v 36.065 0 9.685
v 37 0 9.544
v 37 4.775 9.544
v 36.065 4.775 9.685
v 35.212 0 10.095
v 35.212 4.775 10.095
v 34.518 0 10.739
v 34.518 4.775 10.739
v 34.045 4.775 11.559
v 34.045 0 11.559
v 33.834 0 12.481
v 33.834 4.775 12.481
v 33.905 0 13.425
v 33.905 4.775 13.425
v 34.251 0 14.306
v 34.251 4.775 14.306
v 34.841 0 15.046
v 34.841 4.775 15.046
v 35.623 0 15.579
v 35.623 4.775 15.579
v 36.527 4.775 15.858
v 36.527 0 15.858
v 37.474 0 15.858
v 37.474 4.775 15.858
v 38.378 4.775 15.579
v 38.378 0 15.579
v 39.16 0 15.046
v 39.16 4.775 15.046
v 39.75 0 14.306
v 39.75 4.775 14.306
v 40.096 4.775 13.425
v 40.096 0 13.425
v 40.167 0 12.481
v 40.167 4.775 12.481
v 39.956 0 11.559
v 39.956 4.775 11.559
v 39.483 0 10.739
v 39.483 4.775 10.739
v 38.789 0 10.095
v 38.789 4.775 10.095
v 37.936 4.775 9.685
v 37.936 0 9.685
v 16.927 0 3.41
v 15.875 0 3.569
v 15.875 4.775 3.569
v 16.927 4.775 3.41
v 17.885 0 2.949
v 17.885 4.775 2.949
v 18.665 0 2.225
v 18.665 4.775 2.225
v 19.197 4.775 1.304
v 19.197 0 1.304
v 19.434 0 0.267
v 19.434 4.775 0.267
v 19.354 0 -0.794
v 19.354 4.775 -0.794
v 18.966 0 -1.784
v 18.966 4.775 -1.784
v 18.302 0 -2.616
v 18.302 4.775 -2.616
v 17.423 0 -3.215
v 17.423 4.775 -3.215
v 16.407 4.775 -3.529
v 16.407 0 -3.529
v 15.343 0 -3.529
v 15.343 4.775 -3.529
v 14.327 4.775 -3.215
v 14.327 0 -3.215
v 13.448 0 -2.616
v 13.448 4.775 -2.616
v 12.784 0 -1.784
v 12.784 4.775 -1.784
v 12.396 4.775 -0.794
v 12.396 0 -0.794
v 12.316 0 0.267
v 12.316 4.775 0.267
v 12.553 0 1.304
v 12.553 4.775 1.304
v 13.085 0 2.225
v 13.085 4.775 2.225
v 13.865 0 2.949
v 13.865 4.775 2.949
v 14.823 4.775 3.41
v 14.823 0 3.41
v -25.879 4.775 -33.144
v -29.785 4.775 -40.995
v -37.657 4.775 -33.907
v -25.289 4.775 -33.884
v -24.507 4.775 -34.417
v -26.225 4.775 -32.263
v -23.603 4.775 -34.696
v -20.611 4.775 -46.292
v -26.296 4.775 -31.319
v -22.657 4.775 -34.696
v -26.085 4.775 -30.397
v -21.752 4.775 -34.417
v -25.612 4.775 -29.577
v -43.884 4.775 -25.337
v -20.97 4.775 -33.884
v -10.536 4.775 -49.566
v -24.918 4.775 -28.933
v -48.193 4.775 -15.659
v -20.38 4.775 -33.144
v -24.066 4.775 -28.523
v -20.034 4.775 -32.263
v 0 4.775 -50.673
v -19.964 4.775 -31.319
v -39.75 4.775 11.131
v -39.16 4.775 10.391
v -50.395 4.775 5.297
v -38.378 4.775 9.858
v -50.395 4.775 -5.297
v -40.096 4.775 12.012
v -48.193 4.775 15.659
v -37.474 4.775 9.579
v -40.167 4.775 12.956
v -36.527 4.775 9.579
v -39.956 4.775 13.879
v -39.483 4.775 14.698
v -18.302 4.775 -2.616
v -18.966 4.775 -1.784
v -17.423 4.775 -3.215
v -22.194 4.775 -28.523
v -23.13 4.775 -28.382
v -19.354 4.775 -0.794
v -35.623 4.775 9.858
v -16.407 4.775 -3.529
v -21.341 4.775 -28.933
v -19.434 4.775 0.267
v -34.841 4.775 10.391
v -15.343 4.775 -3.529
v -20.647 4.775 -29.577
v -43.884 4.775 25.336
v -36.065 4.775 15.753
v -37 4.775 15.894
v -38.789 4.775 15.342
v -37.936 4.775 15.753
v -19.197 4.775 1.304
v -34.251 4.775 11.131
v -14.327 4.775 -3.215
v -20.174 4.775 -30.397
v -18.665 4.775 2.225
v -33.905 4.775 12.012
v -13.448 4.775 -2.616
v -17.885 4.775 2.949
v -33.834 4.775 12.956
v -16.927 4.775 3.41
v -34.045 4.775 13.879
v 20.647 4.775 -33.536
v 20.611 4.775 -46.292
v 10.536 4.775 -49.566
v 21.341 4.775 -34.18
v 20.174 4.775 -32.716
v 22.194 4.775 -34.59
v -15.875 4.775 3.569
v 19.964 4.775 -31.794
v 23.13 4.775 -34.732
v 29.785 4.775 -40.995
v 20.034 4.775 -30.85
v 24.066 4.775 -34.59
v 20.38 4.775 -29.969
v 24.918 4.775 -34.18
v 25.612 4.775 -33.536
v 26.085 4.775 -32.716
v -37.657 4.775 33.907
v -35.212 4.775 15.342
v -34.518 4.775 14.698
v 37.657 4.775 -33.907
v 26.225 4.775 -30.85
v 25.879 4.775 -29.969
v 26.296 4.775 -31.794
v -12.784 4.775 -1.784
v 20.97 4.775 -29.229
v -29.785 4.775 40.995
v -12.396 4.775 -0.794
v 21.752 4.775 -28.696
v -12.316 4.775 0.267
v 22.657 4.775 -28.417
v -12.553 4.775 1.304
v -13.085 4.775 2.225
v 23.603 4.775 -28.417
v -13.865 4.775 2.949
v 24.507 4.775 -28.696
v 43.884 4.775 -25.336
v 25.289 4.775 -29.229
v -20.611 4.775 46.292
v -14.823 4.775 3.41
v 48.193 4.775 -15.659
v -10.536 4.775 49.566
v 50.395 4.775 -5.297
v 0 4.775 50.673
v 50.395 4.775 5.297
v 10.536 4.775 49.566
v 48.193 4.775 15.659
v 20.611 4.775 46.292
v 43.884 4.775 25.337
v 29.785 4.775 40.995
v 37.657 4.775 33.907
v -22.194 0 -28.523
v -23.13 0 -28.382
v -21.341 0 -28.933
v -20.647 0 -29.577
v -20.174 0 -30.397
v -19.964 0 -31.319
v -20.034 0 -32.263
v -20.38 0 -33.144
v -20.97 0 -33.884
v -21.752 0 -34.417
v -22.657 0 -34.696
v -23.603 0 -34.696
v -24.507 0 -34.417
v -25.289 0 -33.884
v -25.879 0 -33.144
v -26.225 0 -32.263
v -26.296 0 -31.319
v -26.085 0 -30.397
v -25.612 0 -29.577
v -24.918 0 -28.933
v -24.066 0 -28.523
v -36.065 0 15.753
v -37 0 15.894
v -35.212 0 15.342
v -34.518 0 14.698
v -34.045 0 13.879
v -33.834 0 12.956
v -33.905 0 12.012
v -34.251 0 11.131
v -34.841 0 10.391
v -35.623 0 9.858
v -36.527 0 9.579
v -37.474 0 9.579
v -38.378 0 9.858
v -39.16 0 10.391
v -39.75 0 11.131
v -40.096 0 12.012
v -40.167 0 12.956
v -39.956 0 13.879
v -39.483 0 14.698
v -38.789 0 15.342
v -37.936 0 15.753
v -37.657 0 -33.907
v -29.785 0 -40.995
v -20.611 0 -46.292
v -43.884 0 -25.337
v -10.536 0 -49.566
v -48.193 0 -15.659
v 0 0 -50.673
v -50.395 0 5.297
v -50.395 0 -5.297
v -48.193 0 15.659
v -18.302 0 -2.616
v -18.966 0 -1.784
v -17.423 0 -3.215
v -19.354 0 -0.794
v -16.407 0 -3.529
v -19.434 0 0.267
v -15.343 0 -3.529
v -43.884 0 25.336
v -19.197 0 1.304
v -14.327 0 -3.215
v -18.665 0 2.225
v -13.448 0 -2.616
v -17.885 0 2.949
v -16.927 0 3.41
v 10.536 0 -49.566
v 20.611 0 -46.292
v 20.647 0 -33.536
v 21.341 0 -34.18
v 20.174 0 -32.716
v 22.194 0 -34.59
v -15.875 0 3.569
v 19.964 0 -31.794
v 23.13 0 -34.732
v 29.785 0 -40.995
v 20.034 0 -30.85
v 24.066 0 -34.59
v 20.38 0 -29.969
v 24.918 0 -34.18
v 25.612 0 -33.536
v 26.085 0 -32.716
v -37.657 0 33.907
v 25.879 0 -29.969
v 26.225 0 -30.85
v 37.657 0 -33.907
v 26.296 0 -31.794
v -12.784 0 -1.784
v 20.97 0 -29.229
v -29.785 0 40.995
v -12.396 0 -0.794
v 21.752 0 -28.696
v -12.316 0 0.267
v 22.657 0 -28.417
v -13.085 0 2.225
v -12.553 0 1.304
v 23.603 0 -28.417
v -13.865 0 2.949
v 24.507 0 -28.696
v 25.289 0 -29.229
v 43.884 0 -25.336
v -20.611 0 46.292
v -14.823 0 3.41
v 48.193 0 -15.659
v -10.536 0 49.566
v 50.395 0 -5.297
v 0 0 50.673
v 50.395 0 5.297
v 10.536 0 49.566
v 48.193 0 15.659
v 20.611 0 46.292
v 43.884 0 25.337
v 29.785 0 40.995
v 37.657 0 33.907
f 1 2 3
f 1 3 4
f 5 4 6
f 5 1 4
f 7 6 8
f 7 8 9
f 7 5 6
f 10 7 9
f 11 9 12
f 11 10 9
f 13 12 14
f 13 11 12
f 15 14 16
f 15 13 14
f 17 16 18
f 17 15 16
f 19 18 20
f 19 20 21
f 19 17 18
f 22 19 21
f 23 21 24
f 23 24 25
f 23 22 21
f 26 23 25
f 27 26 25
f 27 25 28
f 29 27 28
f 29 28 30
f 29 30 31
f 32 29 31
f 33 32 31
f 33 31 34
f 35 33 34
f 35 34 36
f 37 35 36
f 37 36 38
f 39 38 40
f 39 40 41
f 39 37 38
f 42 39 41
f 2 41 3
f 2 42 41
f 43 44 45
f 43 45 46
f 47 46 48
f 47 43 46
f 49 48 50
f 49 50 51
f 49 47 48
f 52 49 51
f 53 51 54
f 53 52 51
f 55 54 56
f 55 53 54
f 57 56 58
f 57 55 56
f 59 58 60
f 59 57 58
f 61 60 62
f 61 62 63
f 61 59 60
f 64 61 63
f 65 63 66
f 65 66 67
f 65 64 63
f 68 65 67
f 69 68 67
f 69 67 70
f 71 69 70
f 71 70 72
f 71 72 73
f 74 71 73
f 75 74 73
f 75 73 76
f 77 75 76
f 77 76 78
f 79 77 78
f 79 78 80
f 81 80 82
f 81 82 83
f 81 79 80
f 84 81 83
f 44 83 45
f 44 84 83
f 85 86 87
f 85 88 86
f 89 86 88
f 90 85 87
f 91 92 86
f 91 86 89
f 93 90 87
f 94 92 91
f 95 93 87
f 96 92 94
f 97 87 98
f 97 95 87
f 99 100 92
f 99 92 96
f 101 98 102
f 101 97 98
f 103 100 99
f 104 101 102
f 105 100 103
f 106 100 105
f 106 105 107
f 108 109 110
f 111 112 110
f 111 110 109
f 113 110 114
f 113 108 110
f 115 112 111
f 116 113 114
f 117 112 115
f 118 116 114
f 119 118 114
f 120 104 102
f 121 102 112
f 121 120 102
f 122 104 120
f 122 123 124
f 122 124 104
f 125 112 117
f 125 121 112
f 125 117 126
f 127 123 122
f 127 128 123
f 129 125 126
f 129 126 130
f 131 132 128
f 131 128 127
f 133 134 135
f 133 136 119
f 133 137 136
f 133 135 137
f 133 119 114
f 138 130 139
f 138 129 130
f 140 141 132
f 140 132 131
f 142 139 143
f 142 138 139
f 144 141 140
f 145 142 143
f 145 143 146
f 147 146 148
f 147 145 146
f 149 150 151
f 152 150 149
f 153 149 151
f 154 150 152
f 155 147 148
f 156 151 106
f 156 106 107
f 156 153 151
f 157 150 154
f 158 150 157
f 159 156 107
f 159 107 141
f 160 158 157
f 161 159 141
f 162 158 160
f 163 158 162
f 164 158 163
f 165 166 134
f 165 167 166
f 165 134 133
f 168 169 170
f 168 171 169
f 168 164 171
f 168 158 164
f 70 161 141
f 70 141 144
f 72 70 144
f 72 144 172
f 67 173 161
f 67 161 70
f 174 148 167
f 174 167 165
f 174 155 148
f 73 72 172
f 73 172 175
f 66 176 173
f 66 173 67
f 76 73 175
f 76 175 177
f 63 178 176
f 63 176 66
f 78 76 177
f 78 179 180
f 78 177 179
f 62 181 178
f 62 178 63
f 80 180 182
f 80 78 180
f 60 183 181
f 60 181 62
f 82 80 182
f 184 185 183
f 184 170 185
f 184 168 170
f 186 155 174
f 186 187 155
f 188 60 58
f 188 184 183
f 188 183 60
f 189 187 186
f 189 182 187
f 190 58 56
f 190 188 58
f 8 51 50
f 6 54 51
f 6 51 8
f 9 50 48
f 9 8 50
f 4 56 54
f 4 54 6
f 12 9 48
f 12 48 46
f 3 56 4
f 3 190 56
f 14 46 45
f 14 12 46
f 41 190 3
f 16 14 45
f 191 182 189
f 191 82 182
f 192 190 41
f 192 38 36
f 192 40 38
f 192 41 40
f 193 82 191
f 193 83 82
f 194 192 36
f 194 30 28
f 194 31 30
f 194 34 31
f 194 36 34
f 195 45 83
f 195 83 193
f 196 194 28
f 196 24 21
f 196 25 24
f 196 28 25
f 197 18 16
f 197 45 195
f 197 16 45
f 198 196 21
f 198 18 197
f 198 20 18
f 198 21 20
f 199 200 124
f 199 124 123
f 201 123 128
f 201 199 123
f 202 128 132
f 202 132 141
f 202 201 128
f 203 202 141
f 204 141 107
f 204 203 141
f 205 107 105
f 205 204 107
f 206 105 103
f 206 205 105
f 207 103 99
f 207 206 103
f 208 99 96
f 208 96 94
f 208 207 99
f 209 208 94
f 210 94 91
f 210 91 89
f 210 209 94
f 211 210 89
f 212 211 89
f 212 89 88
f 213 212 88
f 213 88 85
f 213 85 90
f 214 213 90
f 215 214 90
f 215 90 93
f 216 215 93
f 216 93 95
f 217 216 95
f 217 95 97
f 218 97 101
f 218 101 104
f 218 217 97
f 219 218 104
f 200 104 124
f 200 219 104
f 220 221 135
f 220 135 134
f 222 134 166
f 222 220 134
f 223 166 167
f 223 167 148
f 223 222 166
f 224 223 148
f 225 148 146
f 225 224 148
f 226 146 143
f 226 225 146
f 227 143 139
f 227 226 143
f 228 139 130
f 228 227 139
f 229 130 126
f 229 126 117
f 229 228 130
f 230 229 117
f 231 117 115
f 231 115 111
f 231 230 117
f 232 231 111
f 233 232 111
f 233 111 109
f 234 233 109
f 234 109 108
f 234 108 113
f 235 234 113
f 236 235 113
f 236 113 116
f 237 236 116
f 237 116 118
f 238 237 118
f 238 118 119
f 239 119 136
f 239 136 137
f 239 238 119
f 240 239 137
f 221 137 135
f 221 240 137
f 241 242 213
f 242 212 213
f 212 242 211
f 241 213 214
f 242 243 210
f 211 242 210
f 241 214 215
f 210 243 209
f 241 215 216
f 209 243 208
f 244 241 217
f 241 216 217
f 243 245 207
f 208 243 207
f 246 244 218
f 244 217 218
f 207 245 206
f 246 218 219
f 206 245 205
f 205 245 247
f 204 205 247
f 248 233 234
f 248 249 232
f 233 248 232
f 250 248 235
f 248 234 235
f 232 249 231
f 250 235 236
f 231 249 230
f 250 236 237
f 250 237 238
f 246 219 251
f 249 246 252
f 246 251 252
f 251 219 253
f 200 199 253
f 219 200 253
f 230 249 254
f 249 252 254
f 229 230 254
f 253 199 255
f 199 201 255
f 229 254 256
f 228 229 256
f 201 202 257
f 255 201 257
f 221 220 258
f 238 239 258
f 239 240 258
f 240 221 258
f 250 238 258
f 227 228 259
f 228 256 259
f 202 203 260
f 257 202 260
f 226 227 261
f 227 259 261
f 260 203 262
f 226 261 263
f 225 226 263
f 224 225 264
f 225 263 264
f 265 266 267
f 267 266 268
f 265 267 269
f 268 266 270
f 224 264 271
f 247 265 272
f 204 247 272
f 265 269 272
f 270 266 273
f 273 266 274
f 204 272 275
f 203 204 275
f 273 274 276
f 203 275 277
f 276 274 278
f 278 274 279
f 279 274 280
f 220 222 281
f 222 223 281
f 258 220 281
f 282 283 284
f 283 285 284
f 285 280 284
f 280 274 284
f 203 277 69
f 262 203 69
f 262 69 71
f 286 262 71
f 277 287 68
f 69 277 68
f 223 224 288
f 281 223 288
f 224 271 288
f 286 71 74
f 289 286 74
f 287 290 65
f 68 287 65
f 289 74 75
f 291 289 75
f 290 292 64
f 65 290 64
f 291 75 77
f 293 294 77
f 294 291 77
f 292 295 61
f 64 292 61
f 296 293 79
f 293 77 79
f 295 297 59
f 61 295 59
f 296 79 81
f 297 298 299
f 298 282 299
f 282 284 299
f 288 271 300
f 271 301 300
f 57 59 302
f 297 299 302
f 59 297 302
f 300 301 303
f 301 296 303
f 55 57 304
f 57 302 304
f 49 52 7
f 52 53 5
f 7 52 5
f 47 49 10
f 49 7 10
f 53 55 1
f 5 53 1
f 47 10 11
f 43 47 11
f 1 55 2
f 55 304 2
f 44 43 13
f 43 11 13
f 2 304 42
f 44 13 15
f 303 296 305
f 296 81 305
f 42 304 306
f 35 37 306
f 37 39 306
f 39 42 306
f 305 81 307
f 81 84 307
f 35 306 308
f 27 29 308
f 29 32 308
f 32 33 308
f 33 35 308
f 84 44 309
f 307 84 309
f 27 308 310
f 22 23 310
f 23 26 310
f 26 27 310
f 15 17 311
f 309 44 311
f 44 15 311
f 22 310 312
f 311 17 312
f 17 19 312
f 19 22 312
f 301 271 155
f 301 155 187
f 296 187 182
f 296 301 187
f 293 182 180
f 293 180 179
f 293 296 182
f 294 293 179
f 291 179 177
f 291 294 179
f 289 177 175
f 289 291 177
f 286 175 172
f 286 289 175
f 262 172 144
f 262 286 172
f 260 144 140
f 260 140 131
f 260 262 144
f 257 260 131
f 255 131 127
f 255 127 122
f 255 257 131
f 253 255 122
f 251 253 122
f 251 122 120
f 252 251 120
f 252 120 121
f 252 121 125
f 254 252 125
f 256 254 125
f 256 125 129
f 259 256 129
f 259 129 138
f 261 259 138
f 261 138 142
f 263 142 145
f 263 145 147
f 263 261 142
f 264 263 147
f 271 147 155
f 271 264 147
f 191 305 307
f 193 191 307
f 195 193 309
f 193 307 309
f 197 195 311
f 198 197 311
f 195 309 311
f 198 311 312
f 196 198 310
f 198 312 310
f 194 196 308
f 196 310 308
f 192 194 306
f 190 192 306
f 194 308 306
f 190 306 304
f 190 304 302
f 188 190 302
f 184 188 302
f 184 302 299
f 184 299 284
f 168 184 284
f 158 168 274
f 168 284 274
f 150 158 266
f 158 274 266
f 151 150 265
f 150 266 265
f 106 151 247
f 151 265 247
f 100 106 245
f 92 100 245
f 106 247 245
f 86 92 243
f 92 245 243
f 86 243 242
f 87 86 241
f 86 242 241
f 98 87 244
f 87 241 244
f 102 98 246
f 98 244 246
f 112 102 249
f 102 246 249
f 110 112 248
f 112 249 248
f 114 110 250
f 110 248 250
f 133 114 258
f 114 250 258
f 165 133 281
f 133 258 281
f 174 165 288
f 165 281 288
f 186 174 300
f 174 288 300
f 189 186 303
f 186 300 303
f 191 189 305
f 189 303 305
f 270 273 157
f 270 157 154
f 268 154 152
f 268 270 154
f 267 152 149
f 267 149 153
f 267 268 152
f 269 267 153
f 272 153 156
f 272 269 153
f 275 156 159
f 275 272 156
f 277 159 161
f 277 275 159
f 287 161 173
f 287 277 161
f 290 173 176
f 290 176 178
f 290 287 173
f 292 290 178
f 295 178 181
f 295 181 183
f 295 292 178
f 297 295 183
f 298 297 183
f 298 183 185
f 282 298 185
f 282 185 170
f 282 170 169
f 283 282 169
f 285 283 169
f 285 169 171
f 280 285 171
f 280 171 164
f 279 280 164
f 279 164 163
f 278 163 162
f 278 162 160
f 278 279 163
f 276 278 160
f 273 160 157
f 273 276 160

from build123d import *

# Parameters (mm, degrees)
SKETCH1_R           = 50.673
SKETCH1_R_2         = 3.5687
SKETCH1_R_3         = 3.175
BOSS_EXTRUDE1_DEPTH = 4.7752


with BuildPart() as part:
    # Sketch1 → Boss-Extrude1 (new body)
    with BuildSketch(Plane(origin=(0, 0, 0), x_dir=(1, 0, 0), z_dir=(0, 1, 0))):
        with Locations(Location((0, 0, 0), (0, 0, 270))):
            Circle(SKETCH1_R)
        with Locations(Location((-15.875, 0, 0), (0, 0, 270))):
            Circle(SKETCH1_R_2, mode=Mode.SUBTRACT)
        with Locations(Location((15.875, 0, 0), (0, 0, 270))):
            Circle(SKETCH1_R_2, mode=Mode.SUBTRACT)
        with Locations(Location((-37.000474805, -12.718618741, 0), (0, 0, 270))):
            Circle(SKETCH1_R_3, mode=Mode.SUBTRACT)
        with Locations(Location((-23.12973035, 31.556520284, 0), (0, 0, 270))):
            Circle(SKETCH1_R_3, mode=Mode.SUBTRACT)
        with Locations(Location((23.12973035, 31.556520284, 0), (0, 0, 90))):
            Circle(SKETCH1_R_3, mode=Mode.SUBTRACT)
        with Locations(Location((37.000474805, -12.718618741, 0), (0, 0, 90))):
            Circle(SKETCH1_R_3, mode=Mode.SUBTRACT)
    extrude(amount=BOSS_EXTRUDE1_DEPTH)


solid = part.part
